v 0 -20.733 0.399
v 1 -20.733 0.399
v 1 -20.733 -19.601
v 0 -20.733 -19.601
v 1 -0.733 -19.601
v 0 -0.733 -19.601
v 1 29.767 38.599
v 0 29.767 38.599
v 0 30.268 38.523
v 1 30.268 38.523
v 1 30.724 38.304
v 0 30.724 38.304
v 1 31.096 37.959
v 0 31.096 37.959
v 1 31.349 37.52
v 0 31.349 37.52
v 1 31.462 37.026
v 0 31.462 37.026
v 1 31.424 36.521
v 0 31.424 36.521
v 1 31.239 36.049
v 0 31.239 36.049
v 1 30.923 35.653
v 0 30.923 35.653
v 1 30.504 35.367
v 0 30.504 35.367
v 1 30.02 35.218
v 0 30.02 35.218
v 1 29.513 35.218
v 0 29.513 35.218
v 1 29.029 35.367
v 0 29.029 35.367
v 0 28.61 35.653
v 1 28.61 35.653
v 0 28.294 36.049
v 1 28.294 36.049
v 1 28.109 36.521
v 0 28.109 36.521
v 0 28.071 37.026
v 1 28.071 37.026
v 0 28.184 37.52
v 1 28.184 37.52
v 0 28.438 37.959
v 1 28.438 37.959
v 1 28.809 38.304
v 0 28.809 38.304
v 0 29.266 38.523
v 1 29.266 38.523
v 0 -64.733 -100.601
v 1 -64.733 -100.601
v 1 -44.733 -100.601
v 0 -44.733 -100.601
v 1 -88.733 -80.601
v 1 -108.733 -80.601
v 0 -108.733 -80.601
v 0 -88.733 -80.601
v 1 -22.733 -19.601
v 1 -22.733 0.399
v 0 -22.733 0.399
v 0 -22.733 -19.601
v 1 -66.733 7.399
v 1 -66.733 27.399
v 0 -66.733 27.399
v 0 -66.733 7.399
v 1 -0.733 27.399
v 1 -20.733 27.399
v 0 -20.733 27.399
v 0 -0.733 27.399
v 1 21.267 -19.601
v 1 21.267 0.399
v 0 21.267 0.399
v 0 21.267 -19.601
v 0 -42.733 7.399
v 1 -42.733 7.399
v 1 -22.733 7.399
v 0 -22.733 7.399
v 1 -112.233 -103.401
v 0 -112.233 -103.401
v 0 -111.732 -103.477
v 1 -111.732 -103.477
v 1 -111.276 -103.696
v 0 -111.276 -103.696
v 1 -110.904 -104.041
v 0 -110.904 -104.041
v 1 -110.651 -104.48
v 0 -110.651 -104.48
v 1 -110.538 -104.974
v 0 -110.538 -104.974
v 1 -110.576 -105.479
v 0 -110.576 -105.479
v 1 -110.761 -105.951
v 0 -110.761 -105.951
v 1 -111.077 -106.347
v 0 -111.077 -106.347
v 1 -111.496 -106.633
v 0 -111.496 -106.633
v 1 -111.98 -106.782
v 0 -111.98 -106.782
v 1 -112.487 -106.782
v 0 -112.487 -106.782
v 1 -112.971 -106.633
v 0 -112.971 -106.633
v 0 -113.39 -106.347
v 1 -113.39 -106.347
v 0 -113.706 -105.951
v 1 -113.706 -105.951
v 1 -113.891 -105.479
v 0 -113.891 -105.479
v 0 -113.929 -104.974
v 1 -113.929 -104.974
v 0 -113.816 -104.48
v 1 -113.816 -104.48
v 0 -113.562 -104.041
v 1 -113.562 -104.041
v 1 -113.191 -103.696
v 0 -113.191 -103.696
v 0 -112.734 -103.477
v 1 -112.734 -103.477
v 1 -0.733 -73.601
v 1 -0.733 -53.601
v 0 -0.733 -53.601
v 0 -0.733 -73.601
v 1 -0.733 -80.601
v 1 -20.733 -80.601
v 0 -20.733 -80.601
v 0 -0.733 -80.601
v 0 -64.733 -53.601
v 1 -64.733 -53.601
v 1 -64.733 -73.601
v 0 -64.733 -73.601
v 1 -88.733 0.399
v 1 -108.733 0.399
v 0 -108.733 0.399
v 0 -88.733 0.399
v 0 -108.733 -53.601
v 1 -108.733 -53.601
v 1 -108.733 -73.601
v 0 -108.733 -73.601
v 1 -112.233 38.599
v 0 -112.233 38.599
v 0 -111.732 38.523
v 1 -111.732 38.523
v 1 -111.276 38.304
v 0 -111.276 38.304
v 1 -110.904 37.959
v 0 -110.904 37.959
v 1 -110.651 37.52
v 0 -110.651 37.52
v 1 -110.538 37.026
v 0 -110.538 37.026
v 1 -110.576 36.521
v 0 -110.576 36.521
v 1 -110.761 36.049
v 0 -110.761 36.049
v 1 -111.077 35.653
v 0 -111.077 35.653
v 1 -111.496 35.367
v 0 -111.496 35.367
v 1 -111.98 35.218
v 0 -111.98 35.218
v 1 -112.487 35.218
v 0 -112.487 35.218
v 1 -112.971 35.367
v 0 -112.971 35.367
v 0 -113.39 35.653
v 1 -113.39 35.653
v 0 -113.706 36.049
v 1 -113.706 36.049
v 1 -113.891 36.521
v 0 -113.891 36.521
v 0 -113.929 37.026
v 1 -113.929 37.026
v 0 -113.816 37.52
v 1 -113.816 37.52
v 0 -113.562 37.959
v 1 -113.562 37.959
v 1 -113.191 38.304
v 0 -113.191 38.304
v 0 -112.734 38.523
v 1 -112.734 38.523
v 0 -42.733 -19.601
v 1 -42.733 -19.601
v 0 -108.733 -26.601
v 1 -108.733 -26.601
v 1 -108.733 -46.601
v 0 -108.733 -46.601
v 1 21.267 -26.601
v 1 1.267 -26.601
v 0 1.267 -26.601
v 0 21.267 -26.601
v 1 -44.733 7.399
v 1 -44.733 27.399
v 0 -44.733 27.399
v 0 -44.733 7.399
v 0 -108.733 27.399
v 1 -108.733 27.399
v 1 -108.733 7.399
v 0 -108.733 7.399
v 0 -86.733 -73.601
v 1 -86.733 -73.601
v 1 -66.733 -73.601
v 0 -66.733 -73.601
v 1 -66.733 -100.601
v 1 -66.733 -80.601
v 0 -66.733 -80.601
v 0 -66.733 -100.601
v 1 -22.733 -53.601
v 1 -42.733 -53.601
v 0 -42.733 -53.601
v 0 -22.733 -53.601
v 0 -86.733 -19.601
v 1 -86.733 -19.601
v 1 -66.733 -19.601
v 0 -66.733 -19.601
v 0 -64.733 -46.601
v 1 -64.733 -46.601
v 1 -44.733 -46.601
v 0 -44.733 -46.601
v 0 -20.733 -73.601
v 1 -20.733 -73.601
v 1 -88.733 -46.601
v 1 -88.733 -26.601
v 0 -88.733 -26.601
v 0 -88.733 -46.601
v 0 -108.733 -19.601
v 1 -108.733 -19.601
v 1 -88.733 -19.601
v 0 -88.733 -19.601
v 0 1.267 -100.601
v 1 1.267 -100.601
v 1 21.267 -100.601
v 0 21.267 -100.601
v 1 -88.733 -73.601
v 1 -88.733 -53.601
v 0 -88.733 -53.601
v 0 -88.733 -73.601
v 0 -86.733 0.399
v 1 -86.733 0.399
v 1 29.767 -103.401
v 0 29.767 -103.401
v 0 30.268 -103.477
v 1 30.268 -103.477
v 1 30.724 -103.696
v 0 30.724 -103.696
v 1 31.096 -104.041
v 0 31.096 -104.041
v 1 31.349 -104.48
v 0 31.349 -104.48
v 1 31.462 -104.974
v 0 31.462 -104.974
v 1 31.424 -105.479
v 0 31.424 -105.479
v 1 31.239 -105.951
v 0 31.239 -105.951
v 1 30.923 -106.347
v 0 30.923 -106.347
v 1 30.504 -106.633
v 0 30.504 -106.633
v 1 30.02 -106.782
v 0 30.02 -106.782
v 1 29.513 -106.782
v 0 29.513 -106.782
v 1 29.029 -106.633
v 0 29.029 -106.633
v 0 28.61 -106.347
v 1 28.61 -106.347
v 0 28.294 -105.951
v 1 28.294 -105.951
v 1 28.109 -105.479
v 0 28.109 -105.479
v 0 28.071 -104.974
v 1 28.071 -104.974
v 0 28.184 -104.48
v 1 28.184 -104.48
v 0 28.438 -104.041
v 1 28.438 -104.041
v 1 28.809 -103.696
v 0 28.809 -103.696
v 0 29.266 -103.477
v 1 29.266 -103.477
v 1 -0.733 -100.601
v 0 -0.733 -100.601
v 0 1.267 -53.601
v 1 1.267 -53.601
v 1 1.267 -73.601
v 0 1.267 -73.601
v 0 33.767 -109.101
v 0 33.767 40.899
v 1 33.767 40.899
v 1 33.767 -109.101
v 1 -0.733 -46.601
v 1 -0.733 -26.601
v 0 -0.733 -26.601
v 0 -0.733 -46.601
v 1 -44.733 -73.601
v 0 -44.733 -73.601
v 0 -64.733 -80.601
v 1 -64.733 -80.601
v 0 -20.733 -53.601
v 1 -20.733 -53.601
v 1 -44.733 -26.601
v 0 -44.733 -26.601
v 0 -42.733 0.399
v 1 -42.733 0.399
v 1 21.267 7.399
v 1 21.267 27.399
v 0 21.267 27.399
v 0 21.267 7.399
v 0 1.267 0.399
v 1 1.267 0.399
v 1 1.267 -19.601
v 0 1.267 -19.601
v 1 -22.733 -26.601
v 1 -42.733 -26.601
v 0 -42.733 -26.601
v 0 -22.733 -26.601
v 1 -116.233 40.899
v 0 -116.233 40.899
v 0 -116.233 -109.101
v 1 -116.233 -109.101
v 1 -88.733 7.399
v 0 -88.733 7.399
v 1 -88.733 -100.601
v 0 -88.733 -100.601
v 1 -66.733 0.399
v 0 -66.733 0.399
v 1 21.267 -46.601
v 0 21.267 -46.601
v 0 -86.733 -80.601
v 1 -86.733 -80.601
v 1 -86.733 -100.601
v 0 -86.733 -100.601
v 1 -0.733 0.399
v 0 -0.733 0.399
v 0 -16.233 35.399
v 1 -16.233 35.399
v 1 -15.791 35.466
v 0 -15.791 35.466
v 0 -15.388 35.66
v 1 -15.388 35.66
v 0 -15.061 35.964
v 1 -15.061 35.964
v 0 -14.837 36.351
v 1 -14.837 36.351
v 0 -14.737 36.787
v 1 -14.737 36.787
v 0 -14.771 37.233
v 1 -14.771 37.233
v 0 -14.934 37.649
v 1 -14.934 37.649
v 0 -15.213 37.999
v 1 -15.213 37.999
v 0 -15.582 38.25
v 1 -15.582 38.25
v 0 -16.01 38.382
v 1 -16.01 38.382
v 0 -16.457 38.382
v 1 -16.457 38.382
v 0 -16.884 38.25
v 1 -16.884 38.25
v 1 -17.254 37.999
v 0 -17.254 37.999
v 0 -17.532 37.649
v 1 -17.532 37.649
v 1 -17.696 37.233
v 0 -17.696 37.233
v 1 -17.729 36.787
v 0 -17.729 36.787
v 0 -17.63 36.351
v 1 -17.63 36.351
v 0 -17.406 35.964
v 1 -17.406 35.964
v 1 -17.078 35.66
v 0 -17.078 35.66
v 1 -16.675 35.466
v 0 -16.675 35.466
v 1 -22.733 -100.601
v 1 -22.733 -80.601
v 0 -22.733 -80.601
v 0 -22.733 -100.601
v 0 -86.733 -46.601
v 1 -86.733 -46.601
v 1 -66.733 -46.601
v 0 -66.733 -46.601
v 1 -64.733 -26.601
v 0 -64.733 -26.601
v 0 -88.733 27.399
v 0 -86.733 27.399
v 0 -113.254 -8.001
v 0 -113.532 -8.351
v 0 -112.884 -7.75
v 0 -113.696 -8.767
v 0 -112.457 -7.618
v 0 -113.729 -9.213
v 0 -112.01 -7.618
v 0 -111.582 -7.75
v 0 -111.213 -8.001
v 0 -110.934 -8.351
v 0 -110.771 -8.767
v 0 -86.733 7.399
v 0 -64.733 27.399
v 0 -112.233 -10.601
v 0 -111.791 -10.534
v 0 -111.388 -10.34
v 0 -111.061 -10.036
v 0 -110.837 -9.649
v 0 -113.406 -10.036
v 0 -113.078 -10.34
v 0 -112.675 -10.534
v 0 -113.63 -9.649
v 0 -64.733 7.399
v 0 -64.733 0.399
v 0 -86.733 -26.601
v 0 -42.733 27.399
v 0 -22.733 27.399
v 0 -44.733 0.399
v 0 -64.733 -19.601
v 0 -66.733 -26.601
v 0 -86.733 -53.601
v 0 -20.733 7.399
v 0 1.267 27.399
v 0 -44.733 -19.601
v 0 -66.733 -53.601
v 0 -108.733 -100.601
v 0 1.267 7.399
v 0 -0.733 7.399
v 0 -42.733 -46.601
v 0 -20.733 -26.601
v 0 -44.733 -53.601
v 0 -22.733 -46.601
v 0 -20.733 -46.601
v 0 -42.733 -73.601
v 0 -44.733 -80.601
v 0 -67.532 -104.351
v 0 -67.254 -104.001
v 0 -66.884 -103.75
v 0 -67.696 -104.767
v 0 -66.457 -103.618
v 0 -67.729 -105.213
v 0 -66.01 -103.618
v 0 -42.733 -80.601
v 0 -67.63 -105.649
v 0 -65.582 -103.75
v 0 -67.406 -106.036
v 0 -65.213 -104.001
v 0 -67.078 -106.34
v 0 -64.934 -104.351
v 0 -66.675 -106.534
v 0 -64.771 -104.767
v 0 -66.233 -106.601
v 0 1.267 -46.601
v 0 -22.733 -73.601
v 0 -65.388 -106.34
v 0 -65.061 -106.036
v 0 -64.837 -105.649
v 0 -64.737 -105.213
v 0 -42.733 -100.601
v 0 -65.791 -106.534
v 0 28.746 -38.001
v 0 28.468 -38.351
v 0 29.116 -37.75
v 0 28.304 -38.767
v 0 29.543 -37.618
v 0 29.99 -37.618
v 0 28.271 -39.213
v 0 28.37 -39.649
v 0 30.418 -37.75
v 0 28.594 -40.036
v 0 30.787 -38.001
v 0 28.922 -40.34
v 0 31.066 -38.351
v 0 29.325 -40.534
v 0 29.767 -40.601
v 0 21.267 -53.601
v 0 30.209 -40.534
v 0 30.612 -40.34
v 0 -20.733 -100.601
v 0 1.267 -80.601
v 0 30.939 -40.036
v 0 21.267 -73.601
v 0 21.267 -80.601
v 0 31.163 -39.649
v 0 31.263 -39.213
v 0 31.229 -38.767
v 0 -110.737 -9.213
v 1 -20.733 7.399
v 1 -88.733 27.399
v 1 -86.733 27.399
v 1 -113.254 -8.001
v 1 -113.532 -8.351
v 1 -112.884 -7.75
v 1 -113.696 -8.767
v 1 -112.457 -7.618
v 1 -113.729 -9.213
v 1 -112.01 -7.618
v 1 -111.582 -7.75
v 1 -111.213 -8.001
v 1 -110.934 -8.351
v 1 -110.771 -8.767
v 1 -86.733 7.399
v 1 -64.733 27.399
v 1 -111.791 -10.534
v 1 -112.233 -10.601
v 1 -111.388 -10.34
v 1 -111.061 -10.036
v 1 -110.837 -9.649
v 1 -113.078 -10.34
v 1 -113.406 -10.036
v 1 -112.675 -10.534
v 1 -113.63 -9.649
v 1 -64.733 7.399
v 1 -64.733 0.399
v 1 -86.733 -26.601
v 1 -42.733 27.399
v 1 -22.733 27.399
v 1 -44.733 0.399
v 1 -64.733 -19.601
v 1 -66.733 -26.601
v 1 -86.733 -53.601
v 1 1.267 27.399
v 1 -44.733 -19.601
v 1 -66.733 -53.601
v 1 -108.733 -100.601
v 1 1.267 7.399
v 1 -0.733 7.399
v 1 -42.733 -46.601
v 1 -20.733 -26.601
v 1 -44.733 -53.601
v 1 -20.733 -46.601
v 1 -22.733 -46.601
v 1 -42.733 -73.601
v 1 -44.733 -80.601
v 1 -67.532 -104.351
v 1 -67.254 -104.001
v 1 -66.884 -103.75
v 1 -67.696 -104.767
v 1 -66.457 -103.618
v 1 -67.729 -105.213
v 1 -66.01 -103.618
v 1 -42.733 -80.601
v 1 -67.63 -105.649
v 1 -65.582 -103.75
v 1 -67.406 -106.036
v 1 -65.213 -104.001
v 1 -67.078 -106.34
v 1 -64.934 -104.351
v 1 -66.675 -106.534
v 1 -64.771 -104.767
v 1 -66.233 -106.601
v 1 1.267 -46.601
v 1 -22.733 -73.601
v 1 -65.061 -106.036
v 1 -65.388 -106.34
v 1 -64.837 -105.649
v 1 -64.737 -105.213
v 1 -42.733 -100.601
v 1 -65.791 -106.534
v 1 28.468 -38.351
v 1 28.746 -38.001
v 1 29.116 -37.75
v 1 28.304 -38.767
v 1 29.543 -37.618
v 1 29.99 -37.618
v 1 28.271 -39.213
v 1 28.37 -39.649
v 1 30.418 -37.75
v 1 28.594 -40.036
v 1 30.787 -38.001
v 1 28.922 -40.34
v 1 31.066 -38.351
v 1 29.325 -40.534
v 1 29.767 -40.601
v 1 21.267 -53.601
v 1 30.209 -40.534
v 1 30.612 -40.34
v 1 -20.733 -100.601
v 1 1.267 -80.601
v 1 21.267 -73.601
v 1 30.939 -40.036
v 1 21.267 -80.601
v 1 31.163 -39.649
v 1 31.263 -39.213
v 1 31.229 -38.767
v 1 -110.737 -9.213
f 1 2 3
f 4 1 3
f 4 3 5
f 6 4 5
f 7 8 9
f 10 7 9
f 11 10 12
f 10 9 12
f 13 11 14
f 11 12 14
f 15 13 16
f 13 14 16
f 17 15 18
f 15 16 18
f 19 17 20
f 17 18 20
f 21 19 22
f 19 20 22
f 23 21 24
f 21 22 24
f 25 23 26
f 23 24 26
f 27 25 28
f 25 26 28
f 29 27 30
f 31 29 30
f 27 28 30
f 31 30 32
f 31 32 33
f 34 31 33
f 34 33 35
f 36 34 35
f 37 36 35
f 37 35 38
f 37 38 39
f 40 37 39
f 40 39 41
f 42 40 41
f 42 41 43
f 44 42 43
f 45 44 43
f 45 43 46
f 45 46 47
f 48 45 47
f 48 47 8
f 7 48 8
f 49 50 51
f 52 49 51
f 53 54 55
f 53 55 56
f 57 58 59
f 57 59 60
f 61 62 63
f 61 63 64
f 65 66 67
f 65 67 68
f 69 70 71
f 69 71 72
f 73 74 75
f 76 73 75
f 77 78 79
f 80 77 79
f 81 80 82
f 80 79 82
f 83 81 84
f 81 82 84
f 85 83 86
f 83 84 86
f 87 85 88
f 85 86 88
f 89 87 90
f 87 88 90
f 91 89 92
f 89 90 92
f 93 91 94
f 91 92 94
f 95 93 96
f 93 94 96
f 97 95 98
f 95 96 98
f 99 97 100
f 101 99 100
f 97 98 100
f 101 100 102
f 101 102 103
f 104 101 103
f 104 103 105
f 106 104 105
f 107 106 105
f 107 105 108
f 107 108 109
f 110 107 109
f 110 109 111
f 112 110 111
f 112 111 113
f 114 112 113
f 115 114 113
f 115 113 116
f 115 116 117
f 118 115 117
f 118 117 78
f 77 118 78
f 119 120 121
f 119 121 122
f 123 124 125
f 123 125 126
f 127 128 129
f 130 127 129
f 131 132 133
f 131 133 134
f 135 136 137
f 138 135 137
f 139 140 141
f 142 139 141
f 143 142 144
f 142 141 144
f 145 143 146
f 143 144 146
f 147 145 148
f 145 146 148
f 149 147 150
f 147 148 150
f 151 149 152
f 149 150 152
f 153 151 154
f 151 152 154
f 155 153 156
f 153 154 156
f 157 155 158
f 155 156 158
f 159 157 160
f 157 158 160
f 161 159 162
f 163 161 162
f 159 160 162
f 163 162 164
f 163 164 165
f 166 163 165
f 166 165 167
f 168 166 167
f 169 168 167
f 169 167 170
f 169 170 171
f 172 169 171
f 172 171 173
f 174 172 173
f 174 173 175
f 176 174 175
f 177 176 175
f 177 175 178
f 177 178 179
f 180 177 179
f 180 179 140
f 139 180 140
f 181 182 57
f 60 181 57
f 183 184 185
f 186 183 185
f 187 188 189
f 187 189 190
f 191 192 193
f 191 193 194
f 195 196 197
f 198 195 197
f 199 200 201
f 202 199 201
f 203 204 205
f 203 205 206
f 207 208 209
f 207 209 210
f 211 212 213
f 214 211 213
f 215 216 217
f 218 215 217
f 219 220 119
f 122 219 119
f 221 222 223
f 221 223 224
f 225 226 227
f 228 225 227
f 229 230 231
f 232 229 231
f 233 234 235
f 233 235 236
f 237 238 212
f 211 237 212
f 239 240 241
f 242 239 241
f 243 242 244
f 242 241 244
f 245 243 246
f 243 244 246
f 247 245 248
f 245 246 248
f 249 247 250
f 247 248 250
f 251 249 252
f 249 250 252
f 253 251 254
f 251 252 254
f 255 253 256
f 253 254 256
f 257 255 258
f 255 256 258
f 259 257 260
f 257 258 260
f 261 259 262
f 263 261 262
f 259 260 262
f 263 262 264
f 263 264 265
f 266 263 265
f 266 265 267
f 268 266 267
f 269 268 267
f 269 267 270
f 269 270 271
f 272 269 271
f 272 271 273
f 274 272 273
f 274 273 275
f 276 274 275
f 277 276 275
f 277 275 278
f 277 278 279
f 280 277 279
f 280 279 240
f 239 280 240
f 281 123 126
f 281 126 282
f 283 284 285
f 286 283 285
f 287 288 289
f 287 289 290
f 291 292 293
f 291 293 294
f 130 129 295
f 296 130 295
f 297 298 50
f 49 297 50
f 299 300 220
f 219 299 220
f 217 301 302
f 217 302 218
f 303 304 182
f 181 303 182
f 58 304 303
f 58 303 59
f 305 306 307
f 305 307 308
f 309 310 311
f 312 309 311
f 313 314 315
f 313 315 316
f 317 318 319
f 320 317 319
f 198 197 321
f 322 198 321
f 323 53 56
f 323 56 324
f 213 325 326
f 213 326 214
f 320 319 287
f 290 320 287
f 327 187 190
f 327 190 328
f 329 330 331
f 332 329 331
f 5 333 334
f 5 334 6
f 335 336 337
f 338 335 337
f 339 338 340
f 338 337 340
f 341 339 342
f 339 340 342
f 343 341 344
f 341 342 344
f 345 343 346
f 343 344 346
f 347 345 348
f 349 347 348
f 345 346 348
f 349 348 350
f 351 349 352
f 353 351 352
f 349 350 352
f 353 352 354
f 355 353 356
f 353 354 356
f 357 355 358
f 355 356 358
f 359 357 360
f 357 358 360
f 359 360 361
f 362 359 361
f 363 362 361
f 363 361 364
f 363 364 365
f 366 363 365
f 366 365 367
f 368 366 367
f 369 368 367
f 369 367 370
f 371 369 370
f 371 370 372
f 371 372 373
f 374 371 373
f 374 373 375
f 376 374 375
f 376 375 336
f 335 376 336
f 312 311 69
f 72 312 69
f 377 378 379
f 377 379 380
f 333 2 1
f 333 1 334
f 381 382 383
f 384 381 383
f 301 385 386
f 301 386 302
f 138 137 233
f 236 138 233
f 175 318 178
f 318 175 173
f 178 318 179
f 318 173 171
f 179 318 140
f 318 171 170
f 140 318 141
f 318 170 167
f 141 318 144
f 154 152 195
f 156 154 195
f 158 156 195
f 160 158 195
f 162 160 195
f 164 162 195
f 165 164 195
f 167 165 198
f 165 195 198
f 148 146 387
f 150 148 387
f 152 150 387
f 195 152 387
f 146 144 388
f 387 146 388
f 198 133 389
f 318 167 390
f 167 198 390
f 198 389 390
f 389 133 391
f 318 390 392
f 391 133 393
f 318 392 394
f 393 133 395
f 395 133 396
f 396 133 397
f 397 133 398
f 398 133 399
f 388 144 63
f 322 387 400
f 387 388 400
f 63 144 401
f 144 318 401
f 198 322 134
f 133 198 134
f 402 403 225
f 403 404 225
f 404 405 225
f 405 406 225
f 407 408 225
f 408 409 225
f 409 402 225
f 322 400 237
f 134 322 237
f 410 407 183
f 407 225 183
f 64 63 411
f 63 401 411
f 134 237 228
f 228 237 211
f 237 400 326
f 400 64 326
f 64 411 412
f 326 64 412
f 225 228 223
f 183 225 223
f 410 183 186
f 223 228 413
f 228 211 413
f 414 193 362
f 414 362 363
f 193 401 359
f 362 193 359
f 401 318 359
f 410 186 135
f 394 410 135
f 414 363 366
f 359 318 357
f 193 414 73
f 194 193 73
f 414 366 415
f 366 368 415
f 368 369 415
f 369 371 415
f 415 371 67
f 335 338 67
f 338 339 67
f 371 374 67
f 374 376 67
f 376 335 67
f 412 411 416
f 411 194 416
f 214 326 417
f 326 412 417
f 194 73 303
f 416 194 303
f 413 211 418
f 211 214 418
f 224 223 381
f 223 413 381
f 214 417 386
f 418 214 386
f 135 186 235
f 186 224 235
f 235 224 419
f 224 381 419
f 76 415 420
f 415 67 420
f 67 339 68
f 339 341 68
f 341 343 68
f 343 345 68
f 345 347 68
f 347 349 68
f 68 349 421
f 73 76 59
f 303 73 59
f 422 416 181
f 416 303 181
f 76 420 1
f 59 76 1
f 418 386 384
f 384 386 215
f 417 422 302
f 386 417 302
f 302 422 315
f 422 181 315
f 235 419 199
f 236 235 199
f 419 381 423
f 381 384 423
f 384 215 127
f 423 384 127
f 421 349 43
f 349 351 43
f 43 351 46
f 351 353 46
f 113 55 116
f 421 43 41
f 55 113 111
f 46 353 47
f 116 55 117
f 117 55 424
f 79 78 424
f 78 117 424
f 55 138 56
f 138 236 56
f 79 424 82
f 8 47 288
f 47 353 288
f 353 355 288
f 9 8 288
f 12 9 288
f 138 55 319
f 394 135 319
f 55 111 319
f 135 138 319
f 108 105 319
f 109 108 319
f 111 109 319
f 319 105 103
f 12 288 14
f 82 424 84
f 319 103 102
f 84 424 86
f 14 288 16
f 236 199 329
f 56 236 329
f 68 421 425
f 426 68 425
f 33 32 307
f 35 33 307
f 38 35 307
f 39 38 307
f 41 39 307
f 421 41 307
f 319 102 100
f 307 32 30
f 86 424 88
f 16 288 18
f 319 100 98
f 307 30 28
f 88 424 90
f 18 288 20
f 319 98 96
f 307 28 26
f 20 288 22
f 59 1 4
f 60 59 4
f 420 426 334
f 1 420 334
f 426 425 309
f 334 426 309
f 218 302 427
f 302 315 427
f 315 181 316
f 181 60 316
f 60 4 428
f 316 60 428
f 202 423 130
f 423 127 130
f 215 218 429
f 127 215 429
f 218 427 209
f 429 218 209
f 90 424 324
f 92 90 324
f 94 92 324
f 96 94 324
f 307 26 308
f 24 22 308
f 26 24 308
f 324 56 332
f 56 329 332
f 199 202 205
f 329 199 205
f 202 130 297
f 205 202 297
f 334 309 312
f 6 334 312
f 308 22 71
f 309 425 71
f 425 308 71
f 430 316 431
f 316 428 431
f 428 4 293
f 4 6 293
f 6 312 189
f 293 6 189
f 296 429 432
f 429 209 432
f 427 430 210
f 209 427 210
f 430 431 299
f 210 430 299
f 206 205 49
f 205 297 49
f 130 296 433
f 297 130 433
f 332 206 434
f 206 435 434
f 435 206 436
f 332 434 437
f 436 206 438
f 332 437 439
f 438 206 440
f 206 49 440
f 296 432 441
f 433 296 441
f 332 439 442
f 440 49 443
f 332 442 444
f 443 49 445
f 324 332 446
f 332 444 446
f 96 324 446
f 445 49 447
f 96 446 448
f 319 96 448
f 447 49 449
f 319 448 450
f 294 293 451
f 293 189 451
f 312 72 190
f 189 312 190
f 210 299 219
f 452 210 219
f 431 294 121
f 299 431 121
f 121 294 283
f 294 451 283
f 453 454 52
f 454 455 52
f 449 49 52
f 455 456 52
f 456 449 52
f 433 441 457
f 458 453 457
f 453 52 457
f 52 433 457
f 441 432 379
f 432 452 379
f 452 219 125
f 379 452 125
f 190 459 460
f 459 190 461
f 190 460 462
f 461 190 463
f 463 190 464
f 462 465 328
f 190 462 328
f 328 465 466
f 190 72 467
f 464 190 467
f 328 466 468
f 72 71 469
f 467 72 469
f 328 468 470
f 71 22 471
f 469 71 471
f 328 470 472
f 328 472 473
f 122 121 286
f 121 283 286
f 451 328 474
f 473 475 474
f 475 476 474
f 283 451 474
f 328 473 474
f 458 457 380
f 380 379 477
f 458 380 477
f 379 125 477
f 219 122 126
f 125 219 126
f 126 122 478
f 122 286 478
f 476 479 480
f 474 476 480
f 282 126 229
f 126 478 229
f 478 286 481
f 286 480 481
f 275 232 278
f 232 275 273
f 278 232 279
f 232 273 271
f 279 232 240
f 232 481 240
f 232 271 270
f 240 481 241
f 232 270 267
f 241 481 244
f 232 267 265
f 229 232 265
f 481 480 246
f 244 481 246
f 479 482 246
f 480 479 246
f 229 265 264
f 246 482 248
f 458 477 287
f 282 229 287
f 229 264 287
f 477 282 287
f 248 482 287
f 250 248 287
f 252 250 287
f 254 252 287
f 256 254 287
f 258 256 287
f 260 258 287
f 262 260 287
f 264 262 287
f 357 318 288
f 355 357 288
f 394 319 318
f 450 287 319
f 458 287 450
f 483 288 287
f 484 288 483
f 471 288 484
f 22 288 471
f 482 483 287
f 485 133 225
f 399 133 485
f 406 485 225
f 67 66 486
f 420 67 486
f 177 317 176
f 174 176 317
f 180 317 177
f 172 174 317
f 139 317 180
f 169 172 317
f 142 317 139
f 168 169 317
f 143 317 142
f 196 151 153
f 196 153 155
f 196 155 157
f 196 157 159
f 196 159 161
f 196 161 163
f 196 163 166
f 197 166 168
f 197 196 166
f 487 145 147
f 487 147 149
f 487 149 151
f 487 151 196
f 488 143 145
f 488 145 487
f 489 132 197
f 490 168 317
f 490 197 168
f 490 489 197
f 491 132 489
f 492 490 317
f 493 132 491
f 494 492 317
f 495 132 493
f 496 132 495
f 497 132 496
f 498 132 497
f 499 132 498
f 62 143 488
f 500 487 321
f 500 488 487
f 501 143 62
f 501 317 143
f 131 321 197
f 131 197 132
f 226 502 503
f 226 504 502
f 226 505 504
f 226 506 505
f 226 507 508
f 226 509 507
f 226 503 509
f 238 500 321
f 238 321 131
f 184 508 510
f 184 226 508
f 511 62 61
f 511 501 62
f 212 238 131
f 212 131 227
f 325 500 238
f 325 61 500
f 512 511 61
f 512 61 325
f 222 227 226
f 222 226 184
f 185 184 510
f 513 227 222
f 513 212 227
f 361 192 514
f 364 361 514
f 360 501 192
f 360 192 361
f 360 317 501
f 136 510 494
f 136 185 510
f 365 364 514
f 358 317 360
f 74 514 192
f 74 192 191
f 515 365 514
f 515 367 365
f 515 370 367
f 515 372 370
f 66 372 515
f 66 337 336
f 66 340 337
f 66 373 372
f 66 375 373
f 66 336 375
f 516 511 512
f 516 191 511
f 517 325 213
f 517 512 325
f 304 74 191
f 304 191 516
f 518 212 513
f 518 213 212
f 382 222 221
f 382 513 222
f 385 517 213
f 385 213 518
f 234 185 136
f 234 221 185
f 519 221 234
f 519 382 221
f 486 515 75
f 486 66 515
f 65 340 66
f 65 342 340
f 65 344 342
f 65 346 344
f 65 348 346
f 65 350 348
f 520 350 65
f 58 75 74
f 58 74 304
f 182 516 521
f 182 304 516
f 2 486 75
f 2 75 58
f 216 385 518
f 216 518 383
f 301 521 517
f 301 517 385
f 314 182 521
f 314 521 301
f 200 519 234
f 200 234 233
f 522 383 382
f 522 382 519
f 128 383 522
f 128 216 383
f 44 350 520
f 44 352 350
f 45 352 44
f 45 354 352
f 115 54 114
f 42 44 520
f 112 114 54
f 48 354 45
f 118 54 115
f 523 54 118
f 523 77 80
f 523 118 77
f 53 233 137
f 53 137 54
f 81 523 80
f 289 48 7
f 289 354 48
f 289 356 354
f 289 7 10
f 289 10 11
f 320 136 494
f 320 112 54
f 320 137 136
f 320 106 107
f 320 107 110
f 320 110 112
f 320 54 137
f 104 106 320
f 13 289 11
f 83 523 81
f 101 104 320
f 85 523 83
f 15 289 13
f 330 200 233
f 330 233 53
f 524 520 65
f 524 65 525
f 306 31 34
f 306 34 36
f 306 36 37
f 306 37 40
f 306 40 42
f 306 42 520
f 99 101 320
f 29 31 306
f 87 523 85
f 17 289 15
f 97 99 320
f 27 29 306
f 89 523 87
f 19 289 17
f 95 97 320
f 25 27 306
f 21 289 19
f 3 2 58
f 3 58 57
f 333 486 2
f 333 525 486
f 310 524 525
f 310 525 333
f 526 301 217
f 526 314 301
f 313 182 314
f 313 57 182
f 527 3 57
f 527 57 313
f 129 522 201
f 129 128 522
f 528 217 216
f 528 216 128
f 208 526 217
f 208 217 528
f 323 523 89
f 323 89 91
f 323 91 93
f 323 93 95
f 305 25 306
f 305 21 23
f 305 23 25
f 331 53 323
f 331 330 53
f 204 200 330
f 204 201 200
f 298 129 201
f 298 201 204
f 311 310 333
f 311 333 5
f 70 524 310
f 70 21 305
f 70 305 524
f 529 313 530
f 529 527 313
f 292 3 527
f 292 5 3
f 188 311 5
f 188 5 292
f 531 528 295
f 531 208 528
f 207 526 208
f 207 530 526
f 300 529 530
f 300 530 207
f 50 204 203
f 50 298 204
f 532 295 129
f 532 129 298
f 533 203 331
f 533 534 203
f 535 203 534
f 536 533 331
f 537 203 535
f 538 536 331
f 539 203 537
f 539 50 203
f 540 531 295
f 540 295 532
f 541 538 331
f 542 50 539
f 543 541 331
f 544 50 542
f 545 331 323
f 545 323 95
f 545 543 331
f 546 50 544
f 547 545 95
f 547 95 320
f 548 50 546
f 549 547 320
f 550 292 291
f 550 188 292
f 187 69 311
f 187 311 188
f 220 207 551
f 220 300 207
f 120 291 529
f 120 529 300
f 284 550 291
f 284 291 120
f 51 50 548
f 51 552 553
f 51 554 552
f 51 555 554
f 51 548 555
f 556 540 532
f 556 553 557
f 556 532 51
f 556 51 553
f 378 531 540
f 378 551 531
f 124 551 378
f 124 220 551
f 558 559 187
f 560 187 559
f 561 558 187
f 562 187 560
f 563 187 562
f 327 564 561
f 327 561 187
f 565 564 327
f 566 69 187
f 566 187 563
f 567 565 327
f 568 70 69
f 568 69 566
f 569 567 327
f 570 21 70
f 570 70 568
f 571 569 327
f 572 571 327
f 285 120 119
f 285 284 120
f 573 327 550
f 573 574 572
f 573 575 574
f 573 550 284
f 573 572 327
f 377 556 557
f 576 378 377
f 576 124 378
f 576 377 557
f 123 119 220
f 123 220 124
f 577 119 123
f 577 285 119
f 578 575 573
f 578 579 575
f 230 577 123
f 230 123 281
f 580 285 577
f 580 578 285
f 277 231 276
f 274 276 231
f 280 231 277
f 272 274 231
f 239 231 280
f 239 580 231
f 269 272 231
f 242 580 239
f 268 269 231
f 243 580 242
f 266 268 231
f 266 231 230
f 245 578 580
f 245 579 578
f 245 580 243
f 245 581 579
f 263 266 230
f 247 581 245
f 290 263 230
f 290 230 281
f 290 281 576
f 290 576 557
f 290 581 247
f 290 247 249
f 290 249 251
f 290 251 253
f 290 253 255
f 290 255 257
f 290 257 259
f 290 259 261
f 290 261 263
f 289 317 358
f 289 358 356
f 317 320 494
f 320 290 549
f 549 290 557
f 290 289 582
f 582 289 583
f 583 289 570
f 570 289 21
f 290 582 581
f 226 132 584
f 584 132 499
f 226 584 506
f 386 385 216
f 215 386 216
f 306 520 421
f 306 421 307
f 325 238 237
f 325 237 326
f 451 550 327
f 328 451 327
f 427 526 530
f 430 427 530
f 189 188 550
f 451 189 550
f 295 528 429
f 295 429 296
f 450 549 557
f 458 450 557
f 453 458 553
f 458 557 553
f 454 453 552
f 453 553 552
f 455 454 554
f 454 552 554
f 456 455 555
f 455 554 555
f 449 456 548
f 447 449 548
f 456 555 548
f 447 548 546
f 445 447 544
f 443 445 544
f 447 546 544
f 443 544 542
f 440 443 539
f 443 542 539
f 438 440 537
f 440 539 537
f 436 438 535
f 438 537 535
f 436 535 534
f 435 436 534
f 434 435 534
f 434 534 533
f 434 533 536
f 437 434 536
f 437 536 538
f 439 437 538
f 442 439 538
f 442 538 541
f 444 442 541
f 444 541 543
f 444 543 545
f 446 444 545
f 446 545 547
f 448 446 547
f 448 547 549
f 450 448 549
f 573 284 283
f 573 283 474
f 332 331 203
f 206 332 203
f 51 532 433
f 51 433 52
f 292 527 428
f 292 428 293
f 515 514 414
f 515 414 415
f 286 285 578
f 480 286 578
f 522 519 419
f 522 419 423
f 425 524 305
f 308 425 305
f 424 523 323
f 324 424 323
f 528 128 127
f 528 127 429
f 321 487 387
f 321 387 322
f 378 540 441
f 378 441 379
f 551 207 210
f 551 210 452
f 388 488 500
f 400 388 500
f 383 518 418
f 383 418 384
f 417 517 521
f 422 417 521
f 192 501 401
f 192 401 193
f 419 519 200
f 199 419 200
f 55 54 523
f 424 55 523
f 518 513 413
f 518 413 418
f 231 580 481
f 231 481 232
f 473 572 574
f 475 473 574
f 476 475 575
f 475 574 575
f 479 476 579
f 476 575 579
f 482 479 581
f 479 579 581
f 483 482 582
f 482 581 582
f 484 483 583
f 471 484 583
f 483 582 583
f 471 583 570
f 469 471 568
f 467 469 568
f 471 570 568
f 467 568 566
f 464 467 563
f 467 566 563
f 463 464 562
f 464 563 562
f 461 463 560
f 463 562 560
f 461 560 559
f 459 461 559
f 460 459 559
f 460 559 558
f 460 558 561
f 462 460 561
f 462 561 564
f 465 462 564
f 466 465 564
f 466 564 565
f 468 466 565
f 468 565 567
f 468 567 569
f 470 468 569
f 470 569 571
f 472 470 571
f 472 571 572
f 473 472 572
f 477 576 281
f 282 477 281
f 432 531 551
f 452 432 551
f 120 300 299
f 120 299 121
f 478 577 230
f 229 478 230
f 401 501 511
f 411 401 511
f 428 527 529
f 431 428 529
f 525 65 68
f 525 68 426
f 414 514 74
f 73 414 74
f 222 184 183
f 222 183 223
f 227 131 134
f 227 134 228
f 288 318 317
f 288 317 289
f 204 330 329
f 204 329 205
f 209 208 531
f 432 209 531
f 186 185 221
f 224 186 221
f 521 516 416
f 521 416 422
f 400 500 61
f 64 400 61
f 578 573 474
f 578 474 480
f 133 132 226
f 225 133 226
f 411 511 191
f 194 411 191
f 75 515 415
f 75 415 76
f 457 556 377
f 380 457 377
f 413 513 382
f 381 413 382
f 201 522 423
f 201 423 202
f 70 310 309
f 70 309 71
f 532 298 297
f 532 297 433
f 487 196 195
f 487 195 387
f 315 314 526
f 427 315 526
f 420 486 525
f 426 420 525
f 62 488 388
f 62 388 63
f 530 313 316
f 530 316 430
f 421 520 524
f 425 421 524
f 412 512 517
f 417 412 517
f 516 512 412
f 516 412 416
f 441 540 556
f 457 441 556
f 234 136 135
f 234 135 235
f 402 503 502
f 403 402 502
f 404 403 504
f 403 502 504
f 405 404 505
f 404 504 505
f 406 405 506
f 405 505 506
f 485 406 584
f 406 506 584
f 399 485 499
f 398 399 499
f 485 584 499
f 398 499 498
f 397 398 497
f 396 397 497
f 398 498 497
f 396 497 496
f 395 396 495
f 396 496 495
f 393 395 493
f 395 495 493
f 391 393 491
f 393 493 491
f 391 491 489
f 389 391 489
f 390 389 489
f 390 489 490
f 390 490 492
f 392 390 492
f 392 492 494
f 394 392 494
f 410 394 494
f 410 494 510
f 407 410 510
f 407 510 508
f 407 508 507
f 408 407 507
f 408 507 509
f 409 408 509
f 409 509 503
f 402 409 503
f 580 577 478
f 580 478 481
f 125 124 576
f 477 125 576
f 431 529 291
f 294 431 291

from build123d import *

# Parameters (mm, degrees)
SKETCH2_W            = 150
SKETCH2_H            = 150
BOSS_EXTRUDE1_DEPTH  = 1
SKETCH4_W            = 20
SKETCH4_H            = 20
CUT_EXTRUDE1_DEPTH   = 160.418359102
LPATTERN1_COUNT      = 5
LPATTERN1_PITCH      = 27
LPATTERN1_COUNT_DIR2 = 6
LPATTERN1_PITCH_DIR2 = 22
M3_CLEARANCE_HOLE1_D = 3.4
SKETCH8_R            = 1.5
CUT_EXTRUDE2_DEPTH   = 160.418359102


with BuildPart() as part:
    # Sketch2 → Boss-Extrude1 (new body)
    with BuildSketch(Plane(origin=(0, 0, 0), x_dir=(0, 0, -1), z_dir=(1, 0, 0))):
        with Locations((34.101040119, -41.233283804)):
            Rectangle(SKETCH2_W, SKETCH2_H)
    extrude(amount=BOSS_EXTRUDE1_DEPTH)

    # Sketch4 → Cut-Extrude1 (cut, through all)
    with BuildSketch(Plane(origin=(1, 0, 0), x_dir=(0, 0, -1), z_dir=(1, 0, 0))):
        with Locations((-17.398959881, 11.266716196)):
            Rectangle(SKETCH4_W, SKETCH4_H)
    cut_extrude1 = extrude(amount=-CUT_EXTRUDE1_DEPTH, mode=Mode.SUBTRACT)

    # LPattern1: Cut-Extrude1 5 × 6
    with Locations(*[(0, -j * LPATTERN1_PITCH_DIR2, -i * LPATTERN1_PITCH) for i in range(LPATTERN1_COUNT) for j in range(LPATTERN1_COUNT_DIR2) if (i, j) != (0, 0)]):
        add(cut_extrude1, mode=Mode.SUBTRACT)

    # M3 Clearance Hole1 (through all)
    with Locations(Plane(origin=(1, 0, 0), x_dir=(0, 0, -1), z_dir=(1, 0, 0))):
        with Locations((-36.898959881, 29.766716196), (105.101040119, 29.766716196), (105.101040119, -112.233283804), (-36.898959881, -112.233283804)):
            Hole(M3_CLEARANCE_HOLE1_D / 2)

    # Sketch8 → Cut-Extrude2 (cut, through all)
    with BuildSketch(Plane(origin=(1, 0, 0), x_dir=(0, 0, -1), z_dir=(1, 0, 0))):
        with Locations((39.101040119, 29.766716196)):
            Circle(SKETCH8_R)
        with Locations((-36.898959881, -16.233283804)):
            Circle(SKETCH8_R)
        with Locations((9.101040119, -112.233283804)):
            Circle(SKETCH8_R)
        with Locations((105.101040119, -66.233283804)):
            Circle(SKETCH8_R)
    extrude(amount=-CUT_EXTRUDE2_DEPTH, mode=Mode.SUBTRACT)


solid = part.part
